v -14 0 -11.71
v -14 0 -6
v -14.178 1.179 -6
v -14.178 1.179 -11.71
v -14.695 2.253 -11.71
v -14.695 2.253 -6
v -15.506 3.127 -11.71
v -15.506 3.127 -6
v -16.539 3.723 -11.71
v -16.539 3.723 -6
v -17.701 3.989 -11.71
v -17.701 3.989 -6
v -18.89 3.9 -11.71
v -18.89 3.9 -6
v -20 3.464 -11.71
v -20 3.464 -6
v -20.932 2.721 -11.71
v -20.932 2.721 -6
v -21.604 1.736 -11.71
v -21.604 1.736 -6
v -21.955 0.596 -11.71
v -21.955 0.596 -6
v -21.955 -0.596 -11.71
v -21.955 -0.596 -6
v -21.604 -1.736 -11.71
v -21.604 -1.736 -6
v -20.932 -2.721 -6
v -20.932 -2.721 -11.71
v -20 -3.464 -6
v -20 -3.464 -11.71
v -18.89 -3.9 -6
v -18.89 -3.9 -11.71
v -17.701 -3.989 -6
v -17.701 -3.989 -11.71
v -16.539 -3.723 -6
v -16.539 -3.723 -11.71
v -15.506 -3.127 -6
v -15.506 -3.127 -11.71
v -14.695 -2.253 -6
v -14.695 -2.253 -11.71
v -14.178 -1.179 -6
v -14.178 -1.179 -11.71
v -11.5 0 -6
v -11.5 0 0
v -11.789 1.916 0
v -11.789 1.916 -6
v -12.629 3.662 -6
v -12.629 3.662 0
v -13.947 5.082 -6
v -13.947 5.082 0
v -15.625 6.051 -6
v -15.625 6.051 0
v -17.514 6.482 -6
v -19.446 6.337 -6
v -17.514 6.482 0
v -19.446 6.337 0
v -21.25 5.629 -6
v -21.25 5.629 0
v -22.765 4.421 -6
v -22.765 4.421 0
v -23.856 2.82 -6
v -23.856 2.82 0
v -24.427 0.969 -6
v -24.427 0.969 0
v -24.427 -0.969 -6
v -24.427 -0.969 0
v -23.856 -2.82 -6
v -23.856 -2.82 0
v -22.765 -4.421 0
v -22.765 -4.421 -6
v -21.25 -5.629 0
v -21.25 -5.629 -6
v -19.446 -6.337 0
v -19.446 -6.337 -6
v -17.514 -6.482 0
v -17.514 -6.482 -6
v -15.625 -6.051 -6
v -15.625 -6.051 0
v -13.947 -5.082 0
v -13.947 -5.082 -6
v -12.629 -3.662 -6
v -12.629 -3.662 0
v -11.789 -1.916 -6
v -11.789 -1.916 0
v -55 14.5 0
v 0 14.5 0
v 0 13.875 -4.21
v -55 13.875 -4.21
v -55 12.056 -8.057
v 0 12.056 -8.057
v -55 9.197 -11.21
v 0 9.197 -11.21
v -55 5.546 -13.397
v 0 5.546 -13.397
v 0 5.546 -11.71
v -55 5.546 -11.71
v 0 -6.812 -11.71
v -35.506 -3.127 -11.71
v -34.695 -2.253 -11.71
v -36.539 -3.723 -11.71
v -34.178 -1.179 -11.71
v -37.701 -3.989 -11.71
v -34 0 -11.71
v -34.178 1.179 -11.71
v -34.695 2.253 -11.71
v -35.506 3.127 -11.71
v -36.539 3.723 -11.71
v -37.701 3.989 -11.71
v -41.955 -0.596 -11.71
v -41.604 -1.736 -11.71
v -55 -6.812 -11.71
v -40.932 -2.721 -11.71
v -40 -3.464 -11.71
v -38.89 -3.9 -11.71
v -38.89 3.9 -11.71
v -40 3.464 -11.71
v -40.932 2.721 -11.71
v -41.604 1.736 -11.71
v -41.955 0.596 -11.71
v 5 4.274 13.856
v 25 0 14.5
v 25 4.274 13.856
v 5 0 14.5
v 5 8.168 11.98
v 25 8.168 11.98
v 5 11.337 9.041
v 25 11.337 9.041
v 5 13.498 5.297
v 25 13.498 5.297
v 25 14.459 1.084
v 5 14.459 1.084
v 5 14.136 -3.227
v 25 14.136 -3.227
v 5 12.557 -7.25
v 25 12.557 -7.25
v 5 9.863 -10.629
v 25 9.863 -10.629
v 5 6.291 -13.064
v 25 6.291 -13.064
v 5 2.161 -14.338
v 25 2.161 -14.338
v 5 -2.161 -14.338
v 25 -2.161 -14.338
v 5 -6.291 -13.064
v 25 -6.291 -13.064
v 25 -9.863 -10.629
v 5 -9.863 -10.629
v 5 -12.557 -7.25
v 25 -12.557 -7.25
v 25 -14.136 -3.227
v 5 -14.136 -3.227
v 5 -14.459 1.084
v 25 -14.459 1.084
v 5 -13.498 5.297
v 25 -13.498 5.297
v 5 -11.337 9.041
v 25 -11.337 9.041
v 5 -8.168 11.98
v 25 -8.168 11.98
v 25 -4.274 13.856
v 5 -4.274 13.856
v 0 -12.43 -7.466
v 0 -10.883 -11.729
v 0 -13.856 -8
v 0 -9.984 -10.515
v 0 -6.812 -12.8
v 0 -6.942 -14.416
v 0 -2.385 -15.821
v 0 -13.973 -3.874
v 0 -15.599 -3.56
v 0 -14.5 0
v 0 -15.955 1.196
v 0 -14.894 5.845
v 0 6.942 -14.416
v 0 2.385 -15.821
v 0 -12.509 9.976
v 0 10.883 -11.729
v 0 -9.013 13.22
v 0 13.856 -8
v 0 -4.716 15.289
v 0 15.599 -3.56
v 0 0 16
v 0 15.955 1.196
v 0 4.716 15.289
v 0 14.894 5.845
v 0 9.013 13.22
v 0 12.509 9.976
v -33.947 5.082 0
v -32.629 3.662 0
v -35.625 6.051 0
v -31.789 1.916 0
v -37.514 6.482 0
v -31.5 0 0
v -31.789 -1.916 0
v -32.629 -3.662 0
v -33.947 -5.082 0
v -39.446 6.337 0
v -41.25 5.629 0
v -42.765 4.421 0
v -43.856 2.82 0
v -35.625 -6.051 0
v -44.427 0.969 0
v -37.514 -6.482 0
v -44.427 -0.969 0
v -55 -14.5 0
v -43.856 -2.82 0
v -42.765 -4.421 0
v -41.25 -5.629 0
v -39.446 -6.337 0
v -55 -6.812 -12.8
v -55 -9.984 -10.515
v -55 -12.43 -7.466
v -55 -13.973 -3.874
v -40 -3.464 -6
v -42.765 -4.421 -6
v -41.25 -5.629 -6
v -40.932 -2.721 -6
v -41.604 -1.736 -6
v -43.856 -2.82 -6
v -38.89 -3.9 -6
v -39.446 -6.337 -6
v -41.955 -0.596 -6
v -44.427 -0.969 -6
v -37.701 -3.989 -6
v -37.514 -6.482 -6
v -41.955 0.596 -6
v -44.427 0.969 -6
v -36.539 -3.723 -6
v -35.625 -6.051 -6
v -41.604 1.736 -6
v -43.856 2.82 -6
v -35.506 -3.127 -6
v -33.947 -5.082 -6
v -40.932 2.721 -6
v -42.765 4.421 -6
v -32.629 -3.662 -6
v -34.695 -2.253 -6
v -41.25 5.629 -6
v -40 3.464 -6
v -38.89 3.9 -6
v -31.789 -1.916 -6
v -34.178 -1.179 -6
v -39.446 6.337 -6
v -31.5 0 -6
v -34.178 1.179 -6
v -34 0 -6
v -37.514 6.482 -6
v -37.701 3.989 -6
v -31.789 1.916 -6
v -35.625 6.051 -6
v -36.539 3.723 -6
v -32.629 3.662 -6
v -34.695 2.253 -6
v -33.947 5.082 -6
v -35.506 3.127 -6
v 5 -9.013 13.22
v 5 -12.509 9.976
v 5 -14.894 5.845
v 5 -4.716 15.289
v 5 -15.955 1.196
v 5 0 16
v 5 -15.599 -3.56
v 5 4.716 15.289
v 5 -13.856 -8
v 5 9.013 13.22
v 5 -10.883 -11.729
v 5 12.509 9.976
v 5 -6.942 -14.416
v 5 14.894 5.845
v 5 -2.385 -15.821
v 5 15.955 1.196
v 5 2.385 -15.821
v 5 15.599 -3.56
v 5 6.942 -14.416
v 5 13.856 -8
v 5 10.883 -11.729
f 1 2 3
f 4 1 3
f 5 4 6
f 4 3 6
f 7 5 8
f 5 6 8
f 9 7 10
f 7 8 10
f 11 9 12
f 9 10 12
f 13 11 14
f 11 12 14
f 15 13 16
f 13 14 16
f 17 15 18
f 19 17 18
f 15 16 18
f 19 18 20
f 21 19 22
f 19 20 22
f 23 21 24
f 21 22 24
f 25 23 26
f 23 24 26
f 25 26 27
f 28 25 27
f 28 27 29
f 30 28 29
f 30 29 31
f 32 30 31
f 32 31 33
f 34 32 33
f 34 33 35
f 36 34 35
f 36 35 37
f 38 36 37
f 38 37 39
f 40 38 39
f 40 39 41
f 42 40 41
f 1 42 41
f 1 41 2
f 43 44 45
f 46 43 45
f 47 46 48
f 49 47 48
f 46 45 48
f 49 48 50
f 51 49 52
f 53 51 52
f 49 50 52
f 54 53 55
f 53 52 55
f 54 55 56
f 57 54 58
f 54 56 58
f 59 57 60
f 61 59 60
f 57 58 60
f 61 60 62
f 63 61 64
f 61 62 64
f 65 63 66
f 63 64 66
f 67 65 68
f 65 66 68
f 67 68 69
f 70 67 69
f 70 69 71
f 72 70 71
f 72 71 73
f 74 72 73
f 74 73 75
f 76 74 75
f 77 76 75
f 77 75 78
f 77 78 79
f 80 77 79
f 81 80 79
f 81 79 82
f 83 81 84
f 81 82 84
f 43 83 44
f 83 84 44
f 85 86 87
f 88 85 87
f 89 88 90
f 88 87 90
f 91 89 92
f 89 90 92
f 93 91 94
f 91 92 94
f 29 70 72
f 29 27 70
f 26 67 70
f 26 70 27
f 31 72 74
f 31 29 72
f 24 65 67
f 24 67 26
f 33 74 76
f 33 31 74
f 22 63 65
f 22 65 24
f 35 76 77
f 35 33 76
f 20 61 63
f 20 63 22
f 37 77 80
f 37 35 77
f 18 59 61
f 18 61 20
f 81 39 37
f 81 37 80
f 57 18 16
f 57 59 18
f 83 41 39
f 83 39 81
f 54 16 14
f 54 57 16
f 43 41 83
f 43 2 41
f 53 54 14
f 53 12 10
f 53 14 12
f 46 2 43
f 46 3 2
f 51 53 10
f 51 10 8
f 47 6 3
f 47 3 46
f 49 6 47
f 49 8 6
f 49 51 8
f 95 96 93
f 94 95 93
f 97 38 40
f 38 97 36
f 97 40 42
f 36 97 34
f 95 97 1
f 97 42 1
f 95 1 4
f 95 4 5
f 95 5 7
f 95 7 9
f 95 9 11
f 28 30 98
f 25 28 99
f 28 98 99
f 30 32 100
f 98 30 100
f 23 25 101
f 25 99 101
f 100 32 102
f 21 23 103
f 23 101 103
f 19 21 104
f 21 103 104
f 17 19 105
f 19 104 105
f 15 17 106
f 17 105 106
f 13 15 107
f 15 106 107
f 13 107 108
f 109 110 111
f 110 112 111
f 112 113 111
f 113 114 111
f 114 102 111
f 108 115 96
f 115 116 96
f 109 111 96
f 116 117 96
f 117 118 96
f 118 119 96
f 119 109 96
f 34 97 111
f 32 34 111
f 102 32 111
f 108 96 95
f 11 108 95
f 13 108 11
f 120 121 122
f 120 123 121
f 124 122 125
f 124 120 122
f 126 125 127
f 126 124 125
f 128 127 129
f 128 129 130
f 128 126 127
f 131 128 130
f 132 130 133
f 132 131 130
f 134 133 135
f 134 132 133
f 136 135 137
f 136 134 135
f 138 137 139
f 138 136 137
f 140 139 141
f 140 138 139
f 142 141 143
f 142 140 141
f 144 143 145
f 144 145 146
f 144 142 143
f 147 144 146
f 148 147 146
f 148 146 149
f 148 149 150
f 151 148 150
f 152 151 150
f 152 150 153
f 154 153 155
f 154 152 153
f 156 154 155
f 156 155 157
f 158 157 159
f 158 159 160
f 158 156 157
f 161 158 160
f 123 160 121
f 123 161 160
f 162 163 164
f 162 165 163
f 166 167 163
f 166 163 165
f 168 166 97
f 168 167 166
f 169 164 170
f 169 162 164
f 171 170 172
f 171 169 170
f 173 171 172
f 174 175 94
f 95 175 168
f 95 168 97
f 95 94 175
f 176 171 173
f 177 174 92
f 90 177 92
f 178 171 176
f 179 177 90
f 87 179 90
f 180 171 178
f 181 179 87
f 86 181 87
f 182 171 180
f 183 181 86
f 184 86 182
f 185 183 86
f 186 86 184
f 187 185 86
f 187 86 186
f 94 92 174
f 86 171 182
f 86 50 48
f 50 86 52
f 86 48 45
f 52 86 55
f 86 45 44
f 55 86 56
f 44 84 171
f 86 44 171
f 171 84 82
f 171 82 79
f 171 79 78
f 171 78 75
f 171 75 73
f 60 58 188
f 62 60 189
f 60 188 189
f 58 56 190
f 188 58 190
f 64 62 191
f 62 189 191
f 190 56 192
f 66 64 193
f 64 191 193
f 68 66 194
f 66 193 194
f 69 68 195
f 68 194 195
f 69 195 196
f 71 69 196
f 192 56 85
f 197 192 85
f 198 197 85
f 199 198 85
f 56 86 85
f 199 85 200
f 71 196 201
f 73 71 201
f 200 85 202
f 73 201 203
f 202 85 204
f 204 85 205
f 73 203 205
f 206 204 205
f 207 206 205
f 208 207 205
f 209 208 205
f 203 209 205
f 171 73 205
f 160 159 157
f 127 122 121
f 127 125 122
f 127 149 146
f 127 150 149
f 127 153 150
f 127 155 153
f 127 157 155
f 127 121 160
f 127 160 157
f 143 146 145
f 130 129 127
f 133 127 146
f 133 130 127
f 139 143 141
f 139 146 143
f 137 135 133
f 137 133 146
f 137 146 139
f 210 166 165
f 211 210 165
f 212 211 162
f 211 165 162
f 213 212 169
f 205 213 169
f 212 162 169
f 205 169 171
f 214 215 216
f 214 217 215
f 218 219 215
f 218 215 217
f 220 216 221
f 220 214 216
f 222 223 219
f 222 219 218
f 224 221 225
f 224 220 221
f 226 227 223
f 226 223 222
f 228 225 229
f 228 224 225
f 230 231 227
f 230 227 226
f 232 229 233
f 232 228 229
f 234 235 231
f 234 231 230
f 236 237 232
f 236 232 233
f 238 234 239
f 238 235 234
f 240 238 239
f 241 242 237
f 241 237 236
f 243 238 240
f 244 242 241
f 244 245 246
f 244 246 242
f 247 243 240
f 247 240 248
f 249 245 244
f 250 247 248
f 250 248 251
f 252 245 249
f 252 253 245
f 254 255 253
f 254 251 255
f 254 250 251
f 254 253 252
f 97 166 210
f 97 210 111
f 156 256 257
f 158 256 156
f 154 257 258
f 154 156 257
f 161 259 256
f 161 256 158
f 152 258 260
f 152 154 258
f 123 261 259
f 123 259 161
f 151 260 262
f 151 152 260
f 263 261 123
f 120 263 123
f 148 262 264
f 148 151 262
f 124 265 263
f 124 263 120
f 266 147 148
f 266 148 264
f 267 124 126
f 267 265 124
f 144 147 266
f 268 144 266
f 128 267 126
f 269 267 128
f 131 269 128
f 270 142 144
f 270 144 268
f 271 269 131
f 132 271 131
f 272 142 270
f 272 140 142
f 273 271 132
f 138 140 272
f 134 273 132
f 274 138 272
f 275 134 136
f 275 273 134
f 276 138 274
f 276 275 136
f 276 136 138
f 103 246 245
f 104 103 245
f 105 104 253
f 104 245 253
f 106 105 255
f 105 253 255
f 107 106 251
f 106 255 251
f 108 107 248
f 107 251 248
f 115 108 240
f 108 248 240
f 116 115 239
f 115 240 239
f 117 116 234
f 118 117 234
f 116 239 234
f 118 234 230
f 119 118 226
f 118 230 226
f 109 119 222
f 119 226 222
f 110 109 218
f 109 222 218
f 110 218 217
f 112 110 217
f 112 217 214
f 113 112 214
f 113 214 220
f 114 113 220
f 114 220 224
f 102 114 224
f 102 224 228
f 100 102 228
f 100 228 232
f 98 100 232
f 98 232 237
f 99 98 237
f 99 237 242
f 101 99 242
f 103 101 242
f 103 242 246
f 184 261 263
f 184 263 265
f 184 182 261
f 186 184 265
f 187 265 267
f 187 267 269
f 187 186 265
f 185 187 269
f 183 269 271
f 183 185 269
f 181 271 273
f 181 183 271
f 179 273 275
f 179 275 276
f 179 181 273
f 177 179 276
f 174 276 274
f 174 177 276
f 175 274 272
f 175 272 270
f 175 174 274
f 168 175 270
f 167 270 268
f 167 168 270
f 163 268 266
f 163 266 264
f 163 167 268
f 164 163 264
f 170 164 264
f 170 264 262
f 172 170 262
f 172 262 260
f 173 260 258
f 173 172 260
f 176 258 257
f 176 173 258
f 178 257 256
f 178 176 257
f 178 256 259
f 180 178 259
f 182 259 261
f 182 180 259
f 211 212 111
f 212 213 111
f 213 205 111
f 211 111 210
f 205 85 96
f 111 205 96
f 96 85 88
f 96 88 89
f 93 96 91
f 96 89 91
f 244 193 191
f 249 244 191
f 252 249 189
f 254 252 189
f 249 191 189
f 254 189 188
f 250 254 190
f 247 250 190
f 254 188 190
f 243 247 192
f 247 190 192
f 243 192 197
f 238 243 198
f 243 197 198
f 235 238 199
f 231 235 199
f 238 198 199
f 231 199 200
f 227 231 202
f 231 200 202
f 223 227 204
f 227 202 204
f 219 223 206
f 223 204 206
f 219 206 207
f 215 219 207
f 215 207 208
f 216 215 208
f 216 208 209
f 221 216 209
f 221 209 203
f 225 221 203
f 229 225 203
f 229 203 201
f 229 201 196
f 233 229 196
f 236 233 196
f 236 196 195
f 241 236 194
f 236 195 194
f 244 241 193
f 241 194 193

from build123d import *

# Parameters (mm, degrees)
F0_W     = 55
F0_H     = 14.5
F3_DEPTH = 55
F4_R     = 4
F5_DEPTH = 16.001
F7_DEPTH = 55
F4_R_2   = 6.5
F8_DEPTH = 6


with BuildPart() as f1:
    # F0 (on Front) → F1 (revolve)
    with BuildSketch(Plane.XZ):
        with Locations((-27.5, 7.25)):
            Rectangle(F0_W, F0_H)
        Polygon((0, 16), (0, 14.5), (0, 0), (25, 0), (25, 14.5), (5, 14.5), (5, 16), align=None)
    revolve(axis=Axis((-15, 0, 0), (-1, 0, 0)))

    # F2 (on face) → F3 (cut)
    with BuildSketch(Plane(origin=(-55, 0, 0), x_dir=(0, -1, 0), z_dir=(-1, 0, 0))):
        with BuildLine():
            ThreePointArc((14.5, 0), (0, 14.5), (-14.5, 0))
            Line((-14.5, 0), (14.5, 0))
        make_face()
    extrude(amount=-F3_DEPTH, mode=Mode.SUBTRACT)

    # F4 (on face) → F5 (cut, through all)
    with BuildSketch(Plane.XY):
        with Locations((-38, 0)):
            Circle(F4_R)
        with Locations((-18, 0)):
            Circle(F4_R)
    extrude(amount=-F5_DEPTH, mode=Mode.SUBTRACT)

    # F6 (on face) → F7 (cut)
    with BuildSketch(Plane(origin=(-55, 0, 0), x_dir=(0, -1, 0), z_dir=(-1, 0, 0))):
        with BuildLine():
            ThreePointArc((-5.546382, -13.3973), (0.699618, -14.483112), (6.811879, -12.800325))
            Line((6.811879, -12.800325), (6.811879, -11.710467))
            Line((6.811879, -11.710467), (-5.546382, -11.710467))
            Line((-5.546382, -11.710467), (-5.546382, -13.3973))
        make_face()
    extrude(amount=-F7_DEPTH, mode=Mode.SUBTRACT)

    # F4 (on face) → F8 (cut)
    with BuildSketch(Plane.XY):
        with Locations((-38, 0)):
            Circle(F4_R_2)
        with Locations((-38, 0)):
            Circle(F4_R, mode=Mode.SUBTRACT)
        with Locations((-18, 0)):
            Circle(F4_R_2)
        with Locations((-18, 0)):
            Circle(F4_R, mode=Mode.SUBTRACT)
    extrude(amount=-F8_DEPTH, mode=Mode.SUBTRACT)


solid = f1.part
